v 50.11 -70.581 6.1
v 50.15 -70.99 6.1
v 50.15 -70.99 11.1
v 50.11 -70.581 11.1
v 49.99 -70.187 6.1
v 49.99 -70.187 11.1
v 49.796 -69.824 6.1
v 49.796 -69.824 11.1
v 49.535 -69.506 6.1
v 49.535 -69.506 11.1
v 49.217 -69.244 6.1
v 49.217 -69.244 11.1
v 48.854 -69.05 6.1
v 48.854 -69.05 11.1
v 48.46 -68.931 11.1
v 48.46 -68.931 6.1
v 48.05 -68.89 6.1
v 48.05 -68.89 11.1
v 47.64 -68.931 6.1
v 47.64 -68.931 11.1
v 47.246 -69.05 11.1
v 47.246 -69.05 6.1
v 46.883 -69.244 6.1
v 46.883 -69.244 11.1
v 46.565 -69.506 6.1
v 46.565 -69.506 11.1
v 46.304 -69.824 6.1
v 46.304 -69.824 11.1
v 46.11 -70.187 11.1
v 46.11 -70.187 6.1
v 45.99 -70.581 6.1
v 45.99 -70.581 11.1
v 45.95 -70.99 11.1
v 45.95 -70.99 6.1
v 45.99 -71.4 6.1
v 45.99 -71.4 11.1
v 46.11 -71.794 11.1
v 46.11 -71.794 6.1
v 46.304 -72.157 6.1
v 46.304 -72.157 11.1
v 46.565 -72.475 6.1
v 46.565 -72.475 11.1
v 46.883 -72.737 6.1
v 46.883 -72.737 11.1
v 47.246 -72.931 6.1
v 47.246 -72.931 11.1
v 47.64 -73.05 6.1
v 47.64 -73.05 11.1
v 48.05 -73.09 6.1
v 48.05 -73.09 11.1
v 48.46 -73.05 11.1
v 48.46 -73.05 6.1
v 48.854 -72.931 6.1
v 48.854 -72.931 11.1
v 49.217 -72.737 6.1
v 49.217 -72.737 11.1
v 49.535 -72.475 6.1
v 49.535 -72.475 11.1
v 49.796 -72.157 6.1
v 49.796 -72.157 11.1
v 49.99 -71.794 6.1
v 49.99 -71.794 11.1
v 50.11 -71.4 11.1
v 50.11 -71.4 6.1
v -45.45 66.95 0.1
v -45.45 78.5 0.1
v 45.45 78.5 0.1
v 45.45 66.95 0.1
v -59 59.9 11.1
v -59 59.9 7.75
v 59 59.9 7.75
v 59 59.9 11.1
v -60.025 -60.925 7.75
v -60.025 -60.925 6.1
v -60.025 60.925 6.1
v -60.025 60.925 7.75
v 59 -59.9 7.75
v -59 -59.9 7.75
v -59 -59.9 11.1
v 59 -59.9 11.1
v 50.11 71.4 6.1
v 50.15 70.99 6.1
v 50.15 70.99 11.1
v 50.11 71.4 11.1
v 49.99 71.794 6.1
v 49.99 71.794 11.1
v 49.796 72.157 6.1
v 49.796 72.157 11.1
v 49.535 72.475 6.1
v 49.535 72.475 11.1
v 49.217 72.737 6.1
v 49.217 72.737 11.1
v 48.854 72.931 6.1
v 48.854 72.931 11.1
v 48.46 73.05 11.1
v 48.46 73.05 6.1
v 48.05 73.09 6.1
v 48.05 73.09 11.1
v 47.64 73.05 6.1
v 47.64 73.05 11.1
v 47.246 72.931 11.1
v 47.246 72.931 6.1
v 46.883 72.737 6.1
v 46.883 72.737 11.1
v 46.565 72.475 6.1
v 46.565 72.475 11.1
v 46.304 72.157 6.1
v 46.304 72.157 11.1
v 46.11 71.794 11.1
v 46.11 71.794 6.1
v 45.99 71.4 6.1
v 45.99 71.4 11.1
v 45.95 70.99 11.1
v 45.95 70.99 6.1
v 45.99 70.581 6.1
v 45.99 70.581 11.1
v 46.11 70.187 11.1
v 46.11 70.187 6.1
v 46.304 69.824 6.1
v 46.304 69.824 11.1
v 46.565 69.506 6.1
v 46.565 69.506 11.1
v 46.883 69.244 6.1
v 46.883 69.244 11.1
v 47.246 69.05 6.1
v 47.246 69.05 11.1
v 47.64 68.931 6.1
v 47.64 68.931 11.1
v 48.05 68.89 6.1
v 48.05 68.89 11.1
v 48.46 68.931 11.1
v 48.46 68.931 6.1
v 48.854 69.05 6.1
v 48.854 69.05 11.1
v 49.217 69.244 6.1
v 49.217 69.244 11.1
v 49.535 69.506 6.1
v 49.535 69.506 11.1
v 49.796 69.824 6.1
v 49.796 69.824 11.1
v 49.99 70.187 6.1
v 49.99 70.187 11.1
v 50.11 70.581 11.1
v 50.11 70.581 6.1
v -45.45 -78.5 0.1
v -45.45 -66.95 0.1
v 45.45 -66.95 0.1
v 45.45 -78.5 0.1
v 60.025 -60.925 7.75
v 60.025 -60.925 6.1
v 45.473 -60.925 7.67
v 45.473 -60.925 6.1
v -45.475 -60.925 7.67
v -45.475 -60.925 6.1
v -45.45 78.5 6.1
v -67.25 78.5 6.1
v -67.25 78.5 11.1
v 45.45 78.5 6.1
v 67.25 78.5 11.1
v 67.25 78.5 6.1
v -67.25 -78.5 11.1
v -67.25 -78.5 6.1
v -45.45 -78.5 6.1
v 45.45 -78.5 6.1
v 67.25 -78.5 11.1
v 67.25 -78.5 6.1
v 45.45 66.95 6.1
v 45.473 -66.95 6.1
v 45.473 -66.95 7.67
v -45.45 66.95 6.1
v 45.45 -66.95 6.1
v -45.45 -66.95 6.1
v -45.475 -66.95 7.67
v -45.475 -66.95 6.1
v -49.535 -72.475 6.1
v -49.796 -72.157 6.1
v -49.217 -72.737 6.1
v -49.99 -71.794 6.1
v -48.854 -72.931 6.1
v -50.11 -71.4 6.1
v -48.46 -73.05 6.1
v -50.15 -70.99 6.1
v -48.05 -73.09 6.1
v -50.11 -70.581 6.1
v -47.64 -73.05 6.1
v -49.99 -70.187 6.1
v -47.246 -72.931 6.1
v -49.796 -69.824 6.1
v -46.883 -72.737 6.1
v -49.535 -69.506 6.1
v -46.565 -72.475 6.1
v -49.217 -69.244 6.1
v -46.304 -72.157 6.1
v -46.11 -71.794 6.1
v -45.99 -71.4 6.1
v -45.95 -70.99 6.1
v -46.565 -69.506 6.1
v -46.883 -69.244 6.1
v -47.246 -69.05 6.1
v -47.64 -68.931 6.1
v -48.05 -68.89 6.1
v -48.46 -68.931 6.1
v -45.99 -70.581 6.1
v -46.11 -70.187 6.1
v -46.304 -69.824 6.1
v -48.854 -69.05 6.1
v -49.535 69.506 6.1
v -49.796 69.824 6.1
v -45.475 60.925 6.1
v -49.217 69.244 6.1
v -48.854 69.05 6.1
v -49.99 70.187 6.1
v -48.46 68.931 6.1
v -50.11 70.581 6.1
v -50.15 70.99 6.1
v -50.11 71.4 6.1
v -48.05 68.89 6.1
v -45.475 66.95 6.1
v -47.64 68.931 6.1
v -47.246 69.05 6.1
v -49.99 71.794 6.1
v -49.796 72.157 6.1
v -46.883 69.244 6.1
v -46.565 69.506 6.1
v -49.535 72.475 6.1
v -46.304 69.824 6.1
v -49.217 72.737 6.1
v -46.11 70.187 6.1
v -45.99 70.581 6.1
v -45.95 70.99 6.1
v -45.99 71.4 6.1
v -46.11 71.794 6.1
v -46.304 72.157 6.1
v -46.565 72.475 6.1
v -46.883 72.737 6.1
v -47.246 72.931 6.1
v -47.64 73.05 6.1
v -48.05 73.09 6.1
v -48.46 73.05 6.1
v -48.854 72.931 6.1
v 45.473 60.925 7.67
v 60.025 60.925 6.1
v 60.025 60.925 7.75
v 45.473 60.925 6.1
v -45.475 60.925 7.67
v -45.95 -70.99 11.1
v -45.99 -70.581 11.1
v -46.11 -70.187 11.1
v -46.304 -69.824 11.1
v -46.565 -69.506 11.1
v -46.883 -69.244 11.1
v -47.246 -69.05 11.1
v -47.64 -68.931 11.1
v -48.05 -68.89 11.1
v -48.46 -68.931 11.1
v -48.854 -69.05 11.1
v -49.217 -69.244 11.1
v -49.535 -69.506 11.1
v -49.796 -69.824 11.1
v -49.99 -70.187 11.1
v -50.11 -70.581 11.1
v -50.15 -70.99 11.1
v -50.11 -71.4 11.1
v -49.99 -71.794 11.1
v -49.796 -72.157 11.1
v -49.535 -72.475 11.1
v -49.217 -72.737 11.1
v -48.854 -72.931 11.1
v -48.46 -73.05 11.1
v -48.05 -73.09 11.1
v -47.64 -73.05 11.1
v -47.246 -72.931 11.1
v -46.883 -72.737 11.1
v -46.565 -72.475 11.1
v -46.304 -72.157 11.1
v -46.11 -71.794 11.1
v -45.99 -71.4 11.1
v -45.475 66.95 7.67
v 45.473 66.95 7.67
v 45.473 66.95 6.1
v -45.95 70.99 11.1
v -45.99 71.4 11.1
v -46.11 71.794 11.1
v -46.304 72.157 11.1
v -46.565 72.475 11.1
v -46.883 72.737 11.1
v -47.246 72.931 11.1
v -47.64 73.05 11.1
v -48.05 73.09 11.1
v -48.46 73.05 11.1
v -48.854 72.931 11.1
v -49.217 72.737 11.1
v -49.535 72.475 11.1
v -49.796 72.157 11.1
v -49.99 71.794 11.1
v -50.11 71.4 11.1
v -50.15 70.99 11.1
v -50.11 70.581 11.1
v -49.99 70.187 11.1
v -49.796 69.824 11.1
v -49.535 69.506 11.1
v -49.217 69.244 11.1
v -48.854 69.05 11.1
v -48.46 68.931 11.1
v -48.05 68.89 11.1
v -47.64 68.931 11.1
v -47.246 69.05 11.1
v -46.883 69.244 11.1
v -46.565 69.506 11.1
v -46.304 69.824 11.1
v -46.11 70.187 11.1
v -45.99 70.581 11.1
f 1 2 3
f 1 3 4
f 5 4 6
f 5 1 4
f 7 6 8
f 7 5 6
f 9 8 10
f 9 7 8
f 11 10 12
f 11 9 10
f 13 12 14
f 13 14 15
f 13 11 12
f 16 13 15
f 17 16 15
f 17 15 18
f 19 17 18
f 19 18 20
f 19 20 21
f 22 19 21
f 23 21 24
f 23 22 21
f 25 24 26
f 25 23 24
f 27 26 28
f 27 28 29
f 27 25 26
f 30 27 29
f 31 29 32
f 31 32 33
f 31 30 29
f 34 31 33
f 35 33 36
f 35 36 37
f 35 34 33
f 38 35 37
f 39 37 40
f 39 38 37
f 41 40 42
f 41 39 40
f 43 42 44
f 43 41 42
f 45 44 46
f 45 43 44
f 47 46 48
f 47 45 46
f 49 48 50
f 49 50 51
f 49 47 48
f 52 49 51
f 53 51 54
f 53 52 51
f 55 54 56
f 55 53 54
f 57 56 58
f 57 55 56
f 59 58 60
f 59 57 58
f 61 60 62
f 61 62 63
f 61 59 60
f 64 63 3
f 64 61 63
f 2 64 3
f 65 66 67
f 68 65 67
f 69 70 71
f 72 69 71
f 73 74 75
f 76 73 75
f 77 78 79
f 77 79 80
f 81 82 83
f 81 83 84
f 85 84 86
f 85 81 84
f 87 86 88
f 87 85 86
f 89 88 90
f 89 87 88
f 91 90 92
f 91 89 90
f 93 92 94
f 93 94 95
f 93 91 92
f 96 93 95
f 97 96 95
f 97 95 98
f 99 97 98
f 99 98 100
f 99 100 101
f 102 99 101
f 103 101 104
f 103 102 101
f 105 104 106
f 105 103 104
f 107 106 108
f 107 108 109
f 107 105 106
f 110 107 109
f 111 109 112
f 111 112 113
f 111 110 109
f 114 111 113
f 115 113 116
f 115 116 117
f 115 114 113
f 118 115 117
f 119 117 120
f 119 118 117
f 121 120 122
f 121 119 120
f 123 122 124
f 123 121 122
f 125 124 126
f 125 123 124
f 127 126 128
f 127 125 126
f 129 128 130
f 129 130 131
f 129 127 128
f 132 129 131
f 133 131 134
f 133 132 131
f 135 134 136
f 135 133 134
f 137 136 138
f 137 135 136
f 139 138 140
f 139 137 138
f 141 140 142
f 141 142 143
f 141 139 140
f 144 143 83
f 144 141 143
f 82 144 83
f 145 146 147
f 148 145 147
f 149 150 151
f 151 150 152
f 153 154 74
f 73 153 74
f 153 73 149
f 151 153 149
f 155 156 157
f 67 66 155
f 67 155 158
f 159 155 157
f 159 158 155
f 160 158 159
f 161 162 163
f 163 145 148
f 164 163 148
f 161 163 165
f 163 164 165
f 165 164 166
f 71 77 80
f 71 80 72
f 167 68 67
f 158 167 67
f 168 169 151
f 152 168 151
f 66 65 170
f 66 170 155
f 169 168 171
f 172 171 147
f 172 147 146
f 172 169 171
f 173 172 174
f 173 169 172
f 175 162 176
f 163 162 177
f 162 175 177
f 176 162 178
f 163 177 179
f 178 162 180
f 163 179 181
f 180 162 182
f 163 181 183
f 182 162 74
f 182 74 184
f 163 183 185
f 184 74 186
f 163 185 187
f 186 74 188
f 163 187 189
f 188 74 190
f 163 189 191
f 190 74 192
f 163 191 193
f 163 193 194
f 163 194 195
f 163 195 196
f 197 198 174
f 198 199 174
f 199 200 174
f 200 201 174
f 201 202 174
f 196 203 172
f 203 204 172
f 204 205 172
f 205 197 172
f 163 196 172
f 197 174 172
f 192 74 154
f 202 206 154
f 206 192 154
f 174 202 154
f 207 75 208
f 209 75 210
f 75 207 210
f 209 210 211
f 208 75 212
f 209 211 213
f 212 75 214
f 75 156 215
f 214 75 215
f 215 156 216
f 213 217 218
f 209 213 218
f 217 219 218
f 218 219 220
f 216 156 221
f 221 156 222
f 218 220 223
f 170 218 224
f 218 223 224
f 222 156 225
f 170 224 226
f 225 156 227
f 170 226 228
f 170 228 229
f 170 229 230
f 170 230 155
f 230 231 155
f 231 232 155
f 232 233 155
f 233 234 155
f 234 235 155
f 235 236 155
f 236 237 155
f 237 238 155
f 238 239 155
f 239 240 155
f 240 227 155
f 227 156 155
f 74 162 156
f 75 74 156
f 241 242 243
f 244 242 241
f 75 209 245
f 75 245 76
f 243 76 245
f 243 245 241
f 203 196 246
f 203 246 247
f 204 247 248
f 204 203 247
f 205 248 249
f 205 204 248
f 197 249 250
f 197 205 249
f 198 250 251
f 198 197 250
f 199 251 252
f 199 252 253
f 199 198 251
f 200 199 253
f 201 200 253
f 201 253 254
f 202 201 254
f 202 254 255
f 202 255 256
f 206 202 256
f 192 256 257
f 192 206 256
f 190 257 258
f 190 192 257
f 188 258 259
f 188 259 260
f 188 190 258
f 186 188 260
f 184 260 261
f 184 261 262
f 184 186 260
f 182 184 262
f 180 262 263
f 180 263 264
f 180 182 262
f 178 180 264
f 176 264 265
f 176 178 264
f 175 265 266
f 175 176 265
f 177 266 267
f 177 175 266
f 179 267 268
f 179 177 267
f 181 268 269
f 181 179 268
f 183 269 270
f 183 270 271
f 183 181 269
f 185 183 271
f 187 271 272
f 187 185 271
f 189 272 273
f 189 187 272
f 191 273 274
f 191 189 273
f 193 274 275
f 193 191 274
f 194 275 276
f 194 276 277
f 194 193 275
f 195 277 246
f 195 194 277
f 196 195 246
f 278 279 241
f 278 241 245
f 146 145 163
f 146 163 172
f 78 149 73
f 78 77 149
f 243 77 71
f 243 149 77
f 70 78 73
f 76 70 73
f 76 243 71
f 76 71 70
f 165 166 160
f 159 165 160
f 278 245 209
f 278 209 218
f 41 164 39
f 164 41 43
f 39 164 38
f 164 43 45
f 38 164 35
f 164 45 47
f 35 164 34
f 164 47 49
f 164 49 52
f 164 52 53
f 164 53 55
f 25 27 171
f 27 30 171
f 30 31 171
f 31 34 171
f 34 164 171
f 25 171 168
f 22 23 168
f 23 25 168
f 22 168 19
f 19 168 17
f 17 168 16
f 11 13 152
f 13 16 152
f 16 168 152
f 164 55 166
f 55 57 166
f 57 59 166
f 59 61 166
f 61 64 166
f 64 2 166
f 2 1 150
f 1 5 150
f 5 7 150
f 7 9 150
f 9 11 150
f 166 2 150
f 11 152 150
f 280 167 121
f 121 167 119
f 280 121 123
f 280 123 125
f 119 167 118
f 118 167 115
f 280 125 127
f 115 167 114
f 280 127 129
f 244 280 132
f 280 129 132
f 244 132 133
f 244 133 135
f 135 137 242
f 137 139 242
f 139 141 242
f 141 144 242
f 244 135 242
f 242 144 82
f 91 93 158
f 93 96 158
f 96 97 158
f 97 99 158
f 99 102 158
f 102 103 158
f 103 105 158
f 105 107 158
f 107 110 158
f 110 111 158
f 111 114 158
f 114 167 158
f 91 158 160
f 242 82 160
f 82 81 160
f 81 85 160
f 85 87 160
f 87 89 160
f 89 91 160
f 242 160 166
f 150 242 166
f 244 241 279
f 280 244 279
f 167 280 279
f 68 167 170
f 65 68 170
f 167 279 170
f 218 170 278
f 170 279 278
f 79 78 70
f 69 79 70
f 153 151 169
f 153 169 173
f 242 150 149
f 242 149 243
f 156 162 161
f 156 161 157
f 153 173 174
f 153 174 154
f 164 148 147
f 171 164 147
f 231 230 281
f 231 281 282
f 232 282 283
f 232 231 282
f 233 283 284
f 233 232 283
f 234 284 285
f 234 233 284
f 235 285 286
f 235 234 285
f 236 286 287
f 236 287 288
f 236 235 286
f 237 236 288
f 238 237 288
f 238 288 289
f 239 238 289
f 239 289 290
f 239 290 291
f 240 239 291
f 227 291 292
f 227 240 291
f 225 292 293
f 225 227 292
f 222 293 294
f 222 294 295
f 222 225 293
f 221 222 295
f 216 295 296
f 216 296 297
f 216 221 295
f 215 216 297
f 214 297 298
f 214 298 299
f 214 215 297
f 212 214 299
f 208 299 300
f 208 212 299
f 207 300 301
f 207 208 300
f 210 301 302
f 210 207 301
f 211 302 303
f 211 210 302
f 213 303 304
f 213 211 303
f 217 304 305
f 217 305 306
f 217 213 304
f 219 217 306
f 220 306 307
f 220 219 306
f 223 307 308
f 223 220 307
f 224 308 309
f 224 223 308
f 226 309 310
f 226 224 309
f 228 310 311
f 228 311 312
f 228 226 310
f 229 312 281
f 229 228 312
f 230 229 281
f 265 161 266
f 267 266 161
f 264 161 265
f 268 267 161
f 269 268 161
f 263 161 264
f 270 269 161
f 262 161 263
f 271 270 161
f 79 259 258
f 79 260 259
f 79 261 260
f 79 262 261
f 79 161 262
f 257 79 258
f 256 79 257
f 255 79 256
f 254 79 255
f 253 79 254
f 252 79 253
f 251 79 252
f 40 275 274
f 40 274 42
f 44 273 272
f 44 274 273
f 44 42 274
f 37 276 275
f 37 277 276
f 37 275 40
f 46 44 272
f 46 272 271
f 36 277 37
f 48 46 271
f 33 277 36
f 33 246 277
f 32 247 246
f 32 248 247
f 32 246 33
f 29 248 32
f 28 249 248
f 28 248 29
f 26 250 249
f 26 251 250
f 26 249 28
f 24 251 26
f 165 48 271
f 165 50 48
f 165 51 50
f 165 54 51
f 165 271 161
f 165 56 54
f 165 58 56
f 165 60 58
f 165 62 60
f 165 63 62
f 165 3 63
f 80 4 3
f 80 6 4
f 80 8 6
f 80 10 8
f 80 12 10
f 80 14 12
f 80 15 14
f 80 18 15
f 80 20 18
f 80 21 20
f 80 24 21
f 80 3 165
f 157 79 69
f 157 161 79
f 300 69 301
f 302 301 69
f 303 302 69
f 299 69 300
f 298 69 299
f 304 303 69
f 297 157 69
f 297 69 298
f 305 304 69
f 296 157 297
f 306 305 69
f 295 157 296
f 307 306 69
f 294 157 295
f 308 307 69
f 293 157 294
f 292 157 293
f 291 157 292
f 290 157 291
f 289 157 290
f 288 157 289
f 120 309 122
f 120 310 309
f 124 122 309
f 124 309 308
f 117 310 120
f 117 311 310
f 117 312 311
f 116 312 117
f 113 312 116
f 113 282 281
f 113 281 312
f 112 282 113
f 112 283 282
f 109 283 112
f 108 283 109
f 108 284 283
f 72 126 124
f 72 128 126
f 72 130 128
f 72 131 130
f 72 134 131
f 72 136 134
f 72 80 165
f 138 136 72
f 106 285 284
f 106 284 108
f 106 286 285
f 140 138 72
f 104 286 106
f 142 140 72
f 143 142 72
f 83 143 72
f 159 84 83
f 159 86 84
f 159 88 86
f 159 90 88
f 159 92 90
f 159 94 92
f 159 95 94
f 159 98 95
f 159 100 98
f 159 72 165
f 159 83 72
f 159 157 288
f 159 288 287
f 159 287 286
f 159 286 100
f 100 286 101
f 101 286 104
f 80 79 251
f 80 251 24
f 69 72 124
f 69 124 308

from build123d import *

# Parameters (mm, degrees)
SKETCH1_W           = 134.5
SKETCH1_H           = 157
SKETCH1_R           = 2.1
SKETCH1_W_2         = 118
SKETCH1_H_2         = 119.8
BOSS_EXTRUDE1_DEPTH = 5
CUT_EXTRUDE1_START  = -1.57
SKETCH2_W           = 90.947883714
SKETCH2_H           = 6.05
CUT_EXTRUDE1_DEPTH  = 1.57
SKETCH3_W           = 90.9
SKETCH3_H           = 11.55
BOSS_EXTRUDE2_DEPTH = 6
SKETCH4_W           = 120.05
SKETCH4_H           = 121.85
CUT_EXTRUDE2_DEPTH  = 1.65


with BuildPart() as part:
    # Sketch1 → Boss-Extrude1 (new body)
    with BuildSketch(Plane.XY.offset(6.1)):
        Rectangle(SKETCH1_W, SKETCH1_H)
        with Locations((-48.05, 70.990439644)):
            Circle(SKETCH1_R, mode=Mode.SUBTRACT)
        with Locations((48.05, 70.990439644)):
            Circle(SKETCH1_R, mode=Mode.SUBTRACT)
        with Locations((48.05, -70.990439644)):
            Circle(SKETCH1_R, mode=Mode.SUBTRACT)
        with Locations((-48.05, -70.990439644)):
            Circle(SKETCH1_R, mode=Mode.SUBTRACT)
        Rectangle(SKETCH1_W_2, SKETCH1_H_2, mode=Mode.SUBTRACT)
    extrude(amount=BOSS_EXTRUDE1_DEPTH)

    # Sketch2 → Cut-Extrude1 (cut)
    with BuildSketch(Plane(origin=(0, 0, 6.1), x_dir=(-1, 0, 0), z_dir=(0, 0, -1)).offset(CUT_EXTRUDE1_START)):
        with Locations((0.001058143, 63.925)):
            Rectangle(SKETCH2_W, SKETCH2_H)
        with Locations((0.001058143, -63.925)):
            Rectangle(SKETCH2_W, SKETCH2_H)
    extrude(amount=CUT_EXTRUDE1_DEPTH, mode=Mode.SUBTRACT)

    # Sketch3 → Boss-Extrude2 (add)
    with BuildSketch(Plane.XY.offset(0.1)):
        with Locations((0, -72.725)):
            Rectangle(SKETCH3_W, SKETCH3_H)
        with Locations((0, 72.725)):
            Rectangle(SKETCH3_W, SKETCH3_H)
    extrude(amount=BOSS_EXTRUDE2_DEPTH)

    # Sketch4 → Cut-Extrude2 (cut)
    with BuildSketch(Plane(origin=(0, 0, 6.1), x_dir=(-1, 0, 0), z_dir=(0, 0, -1))):
        Rectangle(SKETCH4_W, SKETCH4_H)
    extrude(amount=-CUT_EXTRUDE2_DEPTH, mode=Mode.SUBTRACT)


solid = part.part
